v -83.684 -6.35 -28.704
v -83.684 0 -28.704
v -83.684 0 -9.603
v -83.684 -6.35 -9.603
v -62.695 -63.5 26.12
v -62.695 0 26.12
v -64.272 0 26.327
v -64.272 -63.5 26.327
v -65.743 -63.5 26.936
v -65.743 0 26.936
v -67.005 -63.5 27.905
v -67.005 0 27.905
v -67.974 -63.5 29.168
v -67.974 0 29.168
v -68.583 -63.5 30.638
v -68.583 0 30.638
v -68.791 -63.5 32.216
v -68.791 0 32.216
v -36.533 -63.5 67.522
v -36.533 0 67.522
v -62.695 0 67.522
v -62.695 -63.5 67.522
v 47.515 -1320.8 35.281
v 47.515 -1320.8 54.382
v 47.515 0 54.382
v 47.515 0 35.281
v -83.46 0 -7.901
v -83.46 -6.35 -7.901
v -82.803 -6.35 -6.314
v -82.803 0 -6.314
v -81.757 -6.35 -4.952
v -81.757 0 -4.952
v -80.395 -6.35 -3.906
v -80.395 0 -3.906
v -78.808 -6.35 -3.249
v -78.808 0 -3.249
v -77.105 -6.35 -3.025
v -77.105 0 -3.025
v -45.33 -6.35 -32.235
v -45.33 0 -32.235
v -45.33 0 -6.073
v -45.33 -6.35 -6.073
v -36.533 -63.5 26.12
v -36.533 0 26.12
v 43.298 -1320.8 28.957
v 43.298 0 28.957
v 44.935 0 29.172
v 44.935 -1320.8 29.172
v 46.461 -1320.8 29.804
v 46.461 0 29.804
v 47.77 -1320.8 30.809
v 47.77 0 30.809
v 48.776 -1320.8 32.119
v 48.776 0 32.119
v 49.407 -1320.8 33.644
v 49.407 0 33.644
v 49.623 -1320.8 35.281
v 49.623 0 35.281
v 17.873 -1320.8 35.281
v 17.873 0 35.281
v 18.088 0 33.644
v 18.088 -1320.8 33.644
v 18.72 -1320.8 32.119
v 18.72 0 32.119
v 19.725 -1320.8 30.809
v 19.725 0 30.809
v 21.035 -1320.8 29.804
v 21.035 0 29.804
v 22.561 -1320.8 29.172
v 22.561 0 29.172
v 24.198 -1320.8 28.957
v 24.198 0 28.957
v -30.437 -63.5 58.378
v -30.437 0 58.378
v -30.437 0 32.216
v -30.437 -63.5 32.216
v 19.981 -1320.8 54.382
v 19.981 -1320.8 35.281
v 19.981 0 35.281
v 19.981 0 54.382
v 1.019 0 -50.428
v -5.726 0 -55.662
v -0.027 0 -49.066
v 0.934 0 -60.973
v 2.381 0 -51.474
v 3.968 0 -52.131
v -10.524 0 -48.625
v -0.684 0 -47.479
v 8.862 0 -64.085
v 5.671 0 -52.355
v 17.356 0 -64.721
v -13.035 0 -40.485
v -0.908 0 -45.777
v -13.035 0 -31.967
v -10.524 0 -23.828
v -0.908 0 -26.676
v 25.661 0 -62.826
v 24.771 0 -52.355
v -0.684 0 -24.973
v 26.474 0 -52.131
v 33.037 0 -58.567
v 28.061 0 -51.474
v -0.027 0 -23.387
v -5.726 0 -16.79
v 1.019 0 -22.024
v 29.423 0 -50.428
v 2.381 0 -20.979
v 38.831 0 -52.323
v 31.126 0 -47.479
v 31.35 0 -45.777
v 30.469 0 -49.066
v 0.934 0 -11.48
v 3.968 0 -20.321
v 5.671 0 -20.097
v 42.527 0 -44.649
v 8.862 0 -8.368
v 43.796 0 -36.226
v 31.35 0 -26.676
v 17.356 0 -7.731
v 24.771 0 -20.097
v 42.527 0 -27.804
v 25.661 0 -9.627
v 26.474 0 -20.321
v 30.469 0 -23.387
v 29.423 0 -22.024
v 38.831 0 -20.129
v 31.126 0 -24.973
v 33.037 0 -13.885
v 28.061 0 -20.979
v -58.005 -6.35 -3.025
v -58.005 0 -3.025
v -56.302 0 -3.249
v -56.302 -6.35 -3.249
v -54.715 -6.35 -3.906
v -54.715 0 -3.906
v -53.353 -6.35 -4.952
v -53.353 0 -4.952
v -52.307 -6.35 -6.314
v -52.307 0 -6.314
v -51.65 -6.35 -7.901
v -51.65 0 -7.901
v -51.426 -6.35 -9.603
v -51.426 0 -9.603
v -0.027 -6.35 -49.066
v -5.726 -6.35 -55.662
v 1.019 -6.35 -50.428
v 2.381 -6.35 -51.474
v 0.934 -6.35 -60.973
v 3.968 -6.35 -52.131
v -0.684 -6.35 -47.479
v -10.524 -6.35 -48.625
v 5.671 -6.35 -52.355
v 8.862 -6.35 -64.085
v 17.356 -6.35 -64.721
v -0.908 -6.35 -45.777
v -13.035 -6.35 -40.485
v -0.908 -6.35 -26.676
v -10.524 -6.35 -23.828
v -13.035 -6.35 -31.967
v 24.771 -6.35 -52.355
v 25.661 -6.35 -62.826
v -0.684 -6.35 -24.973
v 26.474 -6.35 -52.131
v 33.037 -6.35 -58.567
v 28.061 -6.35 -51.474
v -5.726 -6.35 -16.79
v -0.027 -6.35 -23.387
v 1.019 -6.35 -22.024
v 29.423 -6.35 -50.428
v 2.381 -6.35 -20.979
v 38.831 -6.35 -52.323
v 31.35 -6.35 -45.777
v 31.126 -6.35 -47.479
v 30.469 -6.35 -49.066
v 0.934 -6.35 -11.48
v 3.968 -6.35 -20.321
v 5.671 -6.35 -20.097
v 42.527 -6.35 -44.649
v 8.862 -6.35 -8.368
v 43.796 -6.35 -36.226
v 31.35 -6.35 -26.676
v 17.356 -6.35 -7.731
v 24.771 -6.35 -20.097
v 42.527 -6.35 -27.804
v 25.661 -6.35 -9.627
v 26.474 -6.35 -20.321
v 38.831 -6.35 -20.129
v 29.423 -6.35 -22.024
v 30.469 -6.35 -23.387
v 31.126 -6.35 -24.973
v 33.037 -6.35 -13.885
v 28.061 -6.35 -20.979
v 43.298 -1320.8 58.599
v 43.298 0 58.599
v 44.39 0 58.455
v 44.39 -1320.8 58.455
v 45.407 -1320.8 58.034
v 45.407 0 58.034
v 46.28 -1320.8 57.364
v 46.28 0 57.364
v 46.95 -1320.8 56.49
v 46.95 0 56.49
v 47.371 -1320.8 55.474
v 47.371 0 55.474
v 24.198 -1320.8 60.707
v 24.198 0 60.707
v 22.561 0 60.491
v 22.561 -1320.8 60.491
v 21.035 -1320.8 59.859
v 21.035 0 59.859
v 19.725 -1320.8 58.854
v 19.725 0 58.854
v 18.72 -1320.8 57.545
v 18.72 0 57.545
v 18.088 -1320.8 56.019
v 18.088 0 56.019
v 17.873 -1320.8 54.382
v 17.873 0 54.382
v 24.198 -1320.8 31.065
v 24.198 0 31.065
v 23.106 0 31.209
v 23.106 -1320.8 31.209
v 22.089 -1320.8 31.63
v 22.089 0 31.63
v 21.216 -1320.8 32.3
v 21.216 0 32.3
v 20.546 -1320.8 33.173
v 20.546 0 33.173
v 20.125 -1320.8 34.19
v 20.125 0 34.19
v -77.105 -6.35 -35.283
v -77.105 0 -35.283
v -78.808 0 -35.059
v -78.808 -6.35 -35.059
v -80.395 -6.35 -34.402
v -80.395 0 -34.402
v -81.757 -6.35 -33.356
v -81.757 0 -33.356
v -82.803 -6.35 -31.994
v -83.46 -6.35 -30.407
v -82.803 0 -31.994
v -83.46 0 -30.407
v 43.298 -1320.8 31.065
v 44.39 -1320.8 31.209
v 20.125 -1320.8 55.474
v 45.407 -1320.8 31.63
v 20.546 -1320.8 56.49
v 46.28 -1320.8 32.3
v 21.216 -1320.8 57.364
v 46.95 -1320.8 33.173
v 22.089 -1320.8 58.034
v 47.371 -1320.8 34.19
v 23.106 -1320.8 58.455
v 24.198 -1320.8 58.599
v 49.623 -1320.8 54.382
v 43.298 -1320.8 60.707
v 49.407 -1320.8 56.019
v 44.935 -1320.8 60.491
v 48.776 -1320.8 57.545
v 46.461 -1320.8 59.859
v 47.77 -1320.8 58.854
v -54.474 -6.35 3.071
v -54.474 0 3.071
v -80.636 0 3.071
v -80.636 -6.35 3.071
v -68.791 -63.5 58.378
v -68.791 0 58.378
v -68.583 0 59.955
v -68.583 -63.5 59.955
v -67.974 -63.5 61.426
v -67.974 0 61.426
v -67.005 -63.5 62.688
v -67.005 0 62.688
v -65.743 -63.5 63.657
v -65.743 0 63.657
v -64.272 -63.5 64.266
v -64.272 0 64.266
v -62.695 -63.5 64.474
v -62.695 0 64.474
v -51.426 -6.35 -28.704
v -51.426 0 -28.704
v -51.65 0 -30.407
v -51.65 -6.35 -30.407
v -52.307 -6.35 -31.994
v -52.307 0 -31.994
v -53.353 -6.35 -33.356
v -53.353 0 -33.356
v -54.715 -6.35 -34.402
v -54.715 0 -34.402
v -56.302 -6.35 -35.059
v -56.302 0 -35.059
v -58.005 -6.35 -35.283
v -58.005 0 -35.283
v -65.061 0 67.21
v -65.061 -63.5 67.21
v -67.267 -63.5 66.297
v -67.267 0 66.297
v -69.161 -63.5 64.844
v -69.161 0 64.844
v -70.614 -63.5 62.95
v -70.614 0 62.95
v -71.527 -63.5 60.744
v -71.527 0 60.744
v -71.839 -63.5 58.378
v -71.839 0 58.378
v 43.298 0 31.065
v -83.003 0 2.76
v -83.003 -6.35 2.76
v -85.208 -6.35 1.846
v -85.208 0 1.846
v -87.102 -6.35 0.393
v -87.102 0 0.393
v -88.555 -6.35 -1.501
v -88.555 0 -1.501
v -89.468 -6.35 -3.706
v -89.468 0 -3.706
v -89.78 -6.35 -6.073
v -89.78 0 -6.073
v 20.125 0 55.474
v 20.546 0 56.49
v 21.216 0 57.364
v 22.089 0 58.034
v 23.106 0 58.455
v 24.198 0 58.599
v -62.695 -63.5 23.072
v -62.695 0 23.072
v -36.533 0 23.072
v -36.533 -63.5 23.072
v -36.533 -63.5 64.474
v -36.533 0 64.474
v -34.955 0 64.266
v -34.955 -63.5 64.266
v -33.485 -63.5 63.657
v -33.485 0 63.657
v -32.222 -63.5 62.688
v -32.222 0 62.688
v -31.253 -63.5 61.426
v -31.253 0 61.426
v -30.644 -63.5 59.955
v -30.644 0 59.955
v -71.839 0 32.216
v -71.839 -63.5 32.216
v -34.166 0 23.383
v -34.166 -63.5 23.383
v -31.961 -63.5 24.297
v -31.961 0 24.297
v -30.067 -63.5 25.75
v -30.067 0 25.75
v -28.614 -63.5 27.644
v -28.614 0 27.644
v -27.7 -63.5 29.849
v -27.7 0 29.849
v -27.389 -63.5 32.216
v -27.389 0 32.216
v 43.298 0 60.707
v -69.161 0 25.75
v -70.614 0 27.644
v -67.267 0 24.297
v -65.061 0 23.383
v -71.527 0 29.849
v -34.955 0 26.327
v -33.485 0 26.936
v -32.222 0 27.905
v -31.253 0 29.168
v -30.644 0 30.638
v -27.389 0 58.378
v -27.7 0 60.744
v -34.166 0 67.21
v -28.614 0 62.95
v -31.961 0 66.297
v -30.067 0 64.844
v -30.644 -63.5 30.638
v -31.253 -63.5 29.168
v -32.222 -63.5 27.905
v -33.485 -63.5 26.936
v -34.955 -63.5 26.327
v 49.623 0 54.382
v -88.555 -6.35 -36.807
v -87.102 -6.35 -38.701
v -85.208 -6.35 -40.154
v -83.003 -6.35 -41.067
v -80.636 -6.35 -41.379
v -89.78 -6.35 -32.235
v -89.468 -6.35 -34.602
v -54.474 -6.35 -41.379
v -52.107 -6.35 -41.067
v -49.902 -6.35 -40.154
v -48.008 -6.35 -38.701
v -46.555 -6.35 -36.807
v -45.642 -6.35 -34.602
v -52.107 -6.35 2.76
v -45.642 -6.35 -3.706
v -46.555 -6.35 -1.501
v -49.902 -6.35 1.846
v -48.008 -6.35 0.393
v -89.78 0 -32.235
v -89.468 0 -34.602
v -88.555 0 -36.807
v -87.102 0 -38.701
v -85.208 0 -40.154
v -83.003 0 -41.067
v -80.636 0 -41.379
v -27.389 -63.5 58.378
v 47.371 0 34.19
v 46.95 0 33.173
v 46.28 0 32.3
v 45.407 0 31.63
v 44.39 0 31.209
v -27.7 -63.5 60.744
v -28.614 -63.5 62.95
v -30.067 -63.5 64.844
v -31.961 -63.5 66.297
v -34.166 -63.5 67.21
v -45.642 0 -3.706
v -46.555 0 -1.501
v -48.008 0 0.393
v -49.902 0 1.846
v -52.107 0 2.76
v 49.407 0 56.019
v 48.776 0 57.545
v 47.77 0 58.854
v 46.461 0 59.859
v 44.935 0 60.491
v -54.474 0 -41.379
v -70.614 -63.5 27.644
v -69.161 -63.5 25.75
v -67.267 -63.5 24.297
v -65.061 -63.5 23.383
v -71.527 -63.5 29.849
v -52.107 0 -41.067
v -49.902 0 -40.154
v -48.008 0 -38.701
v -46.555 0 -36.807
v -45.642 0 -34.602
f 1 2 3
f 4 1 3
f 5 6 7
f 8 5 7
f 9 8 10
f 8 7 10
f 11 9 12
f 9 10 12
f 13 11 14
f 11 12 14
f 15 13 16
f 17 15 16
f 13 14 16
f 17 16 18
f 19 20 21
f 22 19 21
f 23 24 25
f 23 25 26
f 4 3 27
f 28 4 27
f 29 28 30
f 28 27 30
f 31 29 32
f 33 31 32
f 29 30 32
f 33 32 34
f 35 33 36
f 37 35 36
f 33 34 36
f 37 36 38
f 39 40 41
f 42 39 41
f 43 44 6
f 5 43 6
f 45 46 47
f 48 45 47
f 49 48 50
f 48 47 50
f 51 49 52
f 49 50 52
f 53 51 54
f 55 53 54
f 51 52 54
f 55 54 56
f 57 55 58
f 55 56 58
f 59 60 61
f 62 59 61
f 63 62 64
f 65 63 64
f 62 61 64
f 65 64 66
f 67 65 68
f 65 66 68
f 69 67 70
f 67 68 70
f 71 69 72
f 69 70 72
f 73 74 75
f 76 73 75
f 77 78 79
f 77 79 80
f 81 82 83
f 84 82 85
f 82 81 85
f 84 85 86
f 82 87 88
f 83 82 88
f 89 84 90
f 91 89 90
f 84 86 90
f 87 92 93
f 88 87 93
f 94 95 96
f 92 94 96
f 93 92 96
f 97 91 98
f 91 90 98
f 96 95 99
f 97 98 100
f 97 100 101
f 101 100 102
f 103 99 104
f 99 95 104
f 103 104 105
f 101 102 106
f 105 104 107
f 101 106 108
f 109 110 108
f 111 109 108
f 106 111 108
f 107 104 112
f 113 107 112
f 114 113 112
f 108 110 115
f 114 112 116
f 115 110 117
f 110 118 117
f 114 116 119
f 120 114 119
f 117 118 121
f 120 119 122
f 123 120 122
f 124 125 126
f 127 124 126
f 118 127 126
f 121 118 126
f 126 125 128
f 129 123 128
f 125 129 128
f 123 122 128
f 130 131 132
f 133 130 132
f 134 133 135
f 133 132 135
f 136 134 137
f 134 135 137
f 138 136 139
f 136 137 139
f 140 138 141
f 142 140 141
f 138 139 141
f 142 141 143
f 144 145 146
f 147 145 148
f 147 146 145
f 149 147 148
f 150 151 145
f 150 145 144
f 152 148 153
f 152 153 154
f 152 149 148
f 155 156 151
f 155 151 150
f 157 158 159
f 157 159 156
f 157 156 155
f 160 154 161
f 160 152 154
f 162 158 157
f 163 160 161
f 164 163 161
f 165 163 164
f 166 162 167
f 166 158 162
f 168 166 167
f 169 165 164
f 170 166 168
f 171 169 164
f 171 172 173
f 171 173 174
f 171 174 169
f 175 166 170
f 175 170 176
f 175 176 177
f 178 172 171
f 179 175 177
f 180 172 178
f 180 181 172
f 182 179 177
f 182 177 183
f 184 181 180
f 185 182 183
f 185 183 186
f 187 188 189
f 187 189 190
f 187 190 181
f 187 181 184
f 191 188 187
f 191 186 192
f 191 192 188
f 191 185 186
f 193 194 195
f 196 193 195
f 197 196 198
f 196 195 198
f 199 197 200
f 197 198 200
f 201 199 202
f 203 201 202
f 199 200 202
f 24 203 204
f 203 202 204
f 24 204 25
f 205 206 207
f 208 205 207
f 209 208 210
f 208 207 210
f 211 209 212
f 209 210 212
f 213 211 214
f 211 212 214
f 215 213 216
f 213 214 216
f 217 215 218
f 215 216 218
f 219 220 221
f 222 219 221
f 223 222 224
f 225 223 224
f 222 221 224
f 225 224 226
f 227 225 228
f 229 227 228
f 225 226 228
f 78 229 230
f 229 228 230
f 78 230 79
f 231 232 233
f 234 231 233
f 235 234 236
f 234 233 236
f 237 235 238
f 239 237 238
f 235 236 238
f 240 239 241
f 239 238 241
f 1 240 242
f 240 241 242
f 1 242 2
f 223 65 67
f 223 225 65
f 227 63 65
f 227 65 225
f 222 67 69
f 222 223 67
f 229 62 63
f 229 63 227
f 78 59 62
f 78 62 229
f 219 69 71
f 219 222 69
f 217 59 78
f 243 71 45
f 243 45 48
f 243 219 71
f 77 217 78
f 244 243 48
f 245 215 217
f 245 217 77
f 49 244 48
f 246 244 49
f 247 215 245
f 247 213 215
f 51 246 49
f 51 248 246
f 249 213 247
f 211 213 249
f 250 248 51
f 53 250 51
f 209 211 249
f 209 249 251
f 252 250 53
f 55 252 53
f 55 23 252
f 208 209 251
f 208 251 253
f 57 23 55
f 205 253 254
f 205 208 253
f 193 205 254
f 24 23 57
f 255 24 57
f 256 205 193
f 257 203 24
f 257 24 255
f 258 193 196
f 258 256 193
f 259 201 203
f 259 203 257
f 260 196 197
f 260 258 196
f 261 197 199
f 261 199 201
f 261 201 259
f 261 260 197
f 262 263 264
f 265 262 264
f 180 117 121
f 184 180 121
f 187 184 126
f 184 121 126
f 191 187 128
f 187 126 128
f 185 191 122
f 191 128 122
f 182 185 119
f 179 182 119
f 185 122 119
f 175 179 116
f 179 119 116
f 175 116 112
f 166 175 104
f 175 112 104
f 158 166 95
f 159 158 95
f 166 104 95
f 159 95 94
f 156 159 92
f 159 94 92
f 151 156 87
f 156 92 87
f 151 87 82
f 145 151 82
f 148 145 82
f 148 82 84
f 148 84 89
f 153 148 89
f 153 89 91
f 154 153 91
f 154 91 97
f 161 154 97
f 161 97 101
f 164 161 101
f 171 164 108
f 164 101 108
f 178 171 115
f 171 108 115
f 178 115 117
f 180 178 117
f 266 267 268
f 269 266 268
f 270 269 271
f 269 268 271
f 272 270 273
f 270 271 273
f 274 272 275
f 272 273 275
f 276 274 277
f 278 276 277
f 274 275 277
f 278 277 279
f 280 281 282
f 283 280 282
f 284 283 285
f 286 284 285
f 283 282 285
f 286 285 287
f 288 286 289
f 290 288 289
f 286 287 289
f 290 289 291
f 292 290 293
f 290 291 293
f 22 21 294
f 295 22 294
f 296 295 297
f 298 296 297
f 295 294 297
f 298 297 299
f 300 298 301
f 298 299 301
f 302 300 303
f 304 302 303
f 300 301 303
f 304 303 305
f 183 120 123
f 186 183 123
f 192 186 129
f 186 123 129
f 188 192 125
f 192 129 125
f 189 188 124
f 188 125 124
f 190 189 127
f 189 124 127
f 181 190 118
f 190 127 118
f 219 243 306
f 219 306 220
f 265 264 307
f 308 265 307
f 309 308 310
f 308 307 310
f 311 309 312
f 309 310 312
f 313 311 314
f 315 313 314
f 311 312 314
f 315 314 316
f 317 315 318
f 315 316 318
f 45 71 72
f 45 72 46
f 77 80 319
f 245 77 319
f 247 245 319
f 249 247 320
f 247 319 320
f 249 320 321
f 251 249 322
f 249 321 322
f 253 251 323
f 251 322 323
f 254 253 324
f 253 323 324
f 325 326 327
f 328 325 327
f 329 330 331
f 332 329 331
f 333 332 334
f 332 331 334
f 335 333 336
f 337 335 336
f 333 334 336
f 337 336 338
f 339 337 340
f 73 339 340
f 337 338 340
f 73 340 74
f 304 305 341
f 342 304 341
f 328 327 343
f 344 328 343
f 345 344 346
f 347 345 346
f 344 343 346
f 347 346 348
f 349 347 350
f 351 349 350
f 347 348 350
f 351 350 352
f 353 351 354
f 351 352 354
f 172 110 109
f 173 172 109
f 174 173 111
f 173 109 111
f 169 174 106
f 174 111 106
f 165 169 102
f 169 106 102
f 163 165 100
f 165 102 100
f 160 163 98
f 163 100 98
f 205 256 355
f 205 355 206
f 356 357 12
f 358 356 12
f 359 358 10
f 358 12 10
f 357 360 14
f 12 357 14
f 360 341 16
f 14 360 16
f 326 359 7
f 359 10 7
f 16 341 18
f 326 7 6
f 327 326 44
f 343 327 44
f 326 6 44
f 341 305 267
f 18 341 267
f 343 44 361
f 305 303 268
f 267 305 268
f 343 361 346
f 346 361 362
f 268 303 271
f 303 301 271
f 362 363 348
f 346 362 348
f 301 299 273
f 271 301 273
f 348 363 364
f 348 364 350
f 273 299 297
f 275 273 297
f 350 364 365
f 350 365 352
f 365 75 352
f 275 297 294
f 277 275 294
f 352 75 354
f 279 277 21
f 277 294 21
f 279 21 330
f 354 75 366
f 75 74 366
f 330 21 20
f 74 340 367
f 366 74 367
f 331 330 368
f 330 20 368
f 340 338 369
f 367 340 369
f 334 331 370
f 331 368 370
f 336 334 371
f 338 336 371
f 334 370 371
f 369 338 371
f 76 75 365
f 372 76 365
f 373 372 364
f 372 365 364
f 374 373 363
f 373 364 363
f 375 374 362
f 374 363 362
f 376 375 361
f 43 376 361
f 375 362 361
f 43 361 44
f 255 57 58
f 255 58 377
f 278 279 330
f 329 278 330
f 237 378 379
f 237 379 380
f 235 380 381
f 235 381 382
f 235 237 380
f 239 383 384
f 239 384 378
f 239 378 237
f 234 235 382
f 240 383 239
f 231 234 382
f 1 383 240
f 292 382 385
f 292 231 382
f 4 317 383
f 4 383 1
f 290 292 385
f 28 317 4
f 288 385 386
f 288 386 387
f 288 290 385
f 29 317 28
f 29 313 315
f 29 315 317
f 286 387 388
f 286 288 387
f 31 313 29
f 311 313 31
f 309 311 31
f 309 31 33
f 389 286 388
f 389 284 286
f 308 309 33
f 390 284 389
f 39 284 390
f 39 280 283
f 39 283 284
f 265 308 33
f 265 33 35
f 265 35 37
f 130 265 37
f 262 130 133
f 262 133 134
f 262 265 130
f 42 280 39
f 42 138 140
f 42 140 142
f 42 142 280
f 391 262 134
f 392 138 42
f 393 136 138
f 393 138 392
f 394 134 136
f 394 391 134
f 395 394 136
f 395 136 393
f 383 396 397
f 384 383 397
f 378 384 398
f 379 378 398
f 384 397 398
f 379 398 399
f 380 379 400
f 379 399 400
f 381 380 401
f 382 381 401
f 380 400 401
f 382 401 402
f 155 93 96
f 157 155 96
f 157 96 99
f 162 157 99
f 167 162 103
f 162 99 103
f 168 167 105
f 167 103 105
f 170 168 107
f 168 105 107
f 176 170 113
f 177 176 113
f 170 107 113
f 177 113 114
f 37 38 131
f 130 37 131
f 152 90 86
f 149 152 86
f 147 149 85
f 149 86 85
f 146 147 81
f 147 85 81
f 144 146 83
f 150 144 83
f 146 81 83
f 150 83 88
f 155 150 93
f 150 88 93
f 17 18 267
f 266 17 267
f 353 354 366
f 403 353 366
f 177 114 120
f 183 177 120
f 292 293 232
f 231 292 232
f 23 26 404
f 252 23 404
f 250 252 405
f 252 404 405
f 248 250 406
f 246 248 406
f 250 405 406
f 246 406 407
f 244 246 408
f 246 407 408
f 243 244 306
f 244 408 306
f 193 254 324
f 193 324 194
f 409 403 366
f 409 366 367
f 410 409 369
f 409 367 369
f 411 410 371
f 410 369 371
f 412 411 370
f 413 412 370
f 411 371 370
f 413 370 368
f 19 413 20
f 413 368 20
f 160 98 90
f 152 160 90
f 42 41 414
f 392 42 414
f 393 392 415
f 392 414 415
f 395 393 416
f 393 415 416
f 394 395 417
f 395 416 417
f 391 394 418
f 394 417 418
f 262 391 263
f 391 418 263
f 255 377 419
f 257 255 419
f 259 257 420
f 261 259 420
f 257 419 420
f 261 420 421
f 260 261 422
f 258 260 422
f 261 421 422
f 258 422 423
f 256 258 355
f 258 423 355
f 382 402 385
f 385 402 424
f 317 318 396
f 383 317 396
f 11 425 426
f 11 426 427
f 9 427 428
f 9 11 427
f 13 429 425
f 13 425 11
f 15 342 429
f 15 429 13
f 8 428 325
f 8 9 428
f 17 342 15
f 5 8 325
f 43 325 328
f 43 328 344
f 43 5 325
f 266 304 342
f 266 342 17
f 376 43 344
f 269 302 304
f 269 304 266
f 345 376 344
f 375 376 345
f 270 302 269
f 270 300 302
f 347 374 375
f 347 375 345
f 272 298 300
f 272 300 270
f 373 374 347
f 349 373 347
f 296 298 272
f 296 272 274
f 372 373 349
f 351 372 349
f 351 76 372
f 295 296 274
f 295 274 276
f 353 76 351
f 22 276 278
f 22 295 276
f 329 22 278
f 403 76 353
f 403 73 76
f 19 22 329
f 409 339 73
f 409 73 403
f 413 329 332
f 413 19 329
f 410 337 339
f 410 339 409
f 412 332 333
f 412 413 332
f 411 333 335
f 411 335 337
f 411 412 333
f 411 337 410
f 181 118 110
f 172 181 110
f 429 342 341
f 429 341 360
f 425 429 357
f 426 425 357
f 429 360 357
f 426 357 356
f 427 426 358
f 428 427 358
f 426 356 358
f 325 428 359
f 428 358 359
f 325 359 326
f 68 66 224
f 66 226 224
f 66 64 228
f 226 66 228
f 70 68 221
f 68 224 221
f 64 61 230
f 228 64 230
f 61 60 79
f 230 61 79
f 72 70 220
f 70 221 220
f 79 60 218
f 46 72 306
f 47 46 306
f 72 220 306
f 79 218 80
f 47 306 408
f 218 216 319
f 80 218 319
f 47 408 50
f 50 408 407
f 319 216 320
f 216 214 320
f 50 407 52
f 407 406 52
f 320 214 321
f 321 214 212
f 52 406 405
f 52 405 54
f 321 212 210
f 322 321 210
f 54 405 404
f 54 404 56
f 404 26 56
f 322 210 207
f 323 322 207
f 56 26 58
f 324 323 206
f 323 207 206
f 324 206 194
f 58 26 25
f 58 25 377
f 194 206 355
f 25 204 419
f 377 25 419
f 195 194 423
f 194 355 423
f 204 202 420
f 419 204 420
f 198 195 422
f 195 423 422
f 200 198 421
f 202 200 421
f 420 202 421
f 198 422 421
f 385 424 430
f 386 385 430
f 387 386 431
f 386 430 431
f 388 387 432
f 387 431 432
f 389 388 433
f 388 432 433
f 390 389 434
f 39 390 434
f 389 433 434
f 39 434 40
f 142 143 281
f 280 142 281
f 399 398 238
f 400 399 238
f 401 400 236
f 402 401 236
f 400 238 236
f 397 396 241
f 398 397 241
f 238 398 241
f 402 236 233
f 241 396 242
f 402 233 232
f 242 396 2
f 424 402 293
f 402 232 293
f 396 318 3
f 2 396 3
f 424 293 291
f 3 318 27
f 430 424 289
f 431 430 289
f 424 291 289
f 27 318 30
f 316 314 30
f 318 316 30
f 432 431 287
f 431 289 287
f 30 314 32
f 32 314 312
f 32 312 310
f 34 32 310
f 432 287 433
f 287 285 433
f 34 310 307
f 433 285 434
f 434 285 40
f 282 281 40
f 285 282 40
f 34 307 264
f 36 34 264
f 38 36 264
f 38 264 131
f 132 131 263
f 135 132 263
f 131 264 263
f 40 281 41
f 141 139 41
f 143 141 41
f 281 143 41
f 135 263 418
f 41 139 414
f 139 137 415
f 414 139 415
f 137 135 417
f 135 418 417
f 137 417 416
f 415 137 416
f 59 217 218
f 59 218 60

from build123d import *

# Parameters (mm, degrees)
F1_DEPTH = 63.5
F3_DEPTH = 1320.8
F5_DEPTH = 6.35
F6_R     = 28.575
F7_DEPTH = 6.35


with BuildPart() as f1:
    # F0 (on Front) → F1 (new body)
    with BuildSketch(Plane.XZ):
        with BuildLine():
            Line((-36.532738, 67.521737), (-62.694738, 67.521737))
            ThreePointArc((-62.694738, 67.521737), (-69.160523, 64.843521), (-71.838738, 58.377737))
            Line((-71.838738, 58.377737), (-71.838738, 32.215737))
            ThreePointArc((-71.838738, 32.215737), (-69.160523, 25.749953), (-62.694738, 23.071737))
            Line((-62.694738, 23.071737), (-36.532738, 23.071737))
            ThreePointArc((-36.532738, 23.071737), (-30.066954, 25.749953), (-27.388738, 32.215737))
            Line((-27.388738, 32.215737), (-27.388738, 58.377737))
            ThreePointArc((-27.388738, 58.377737), (-30.066954, 64.843521), (-36.532738, 67.521737))
        make_face()
        with BuildLine():
            ThreePointArc((-68.790738, 58.377737), (-67.005261, 62.68826), (-62.694738, 64.473737))
            Line((-62.694738, 64.473737), (-36.532738, 64.473737))
            ThreePointArc((-36.532738, 64.473737), (-32.222215, 62.68826), (-30.436738, 58.377737))
            Line((-30.436738, 58.377737), (-30.436738, 32.215737))
            ThreePointArc((-30.436738, 32.215737), (-32.222215, 27.905214), (-36.532738, 26.119737))
            Line((-36.532738, 26.119737), (-62.694738, 26.119737))
            ThreePointArc((-62.694738, 26.119737), (-67.005261, 27.905214), (-68.790738, 32.215737))
            Line((-68.790738, 32.215737), (-68.790738, 58.377737))
        make_face(mode=Mode.SUBTRACT)
    extrude(amount=F1_DEPTH)


with BuildPart() as f3:
    # F2 (on Front) → F3 (new body)
    with BuildSketch(Plane.XZ):
        with BuildLine():
            Line((43.298324, 60.706825), (24.197524, 60.706825))
            ThreePointArc((24.197524, 60.706825), (19.725356, 58.854393), (17.872924, 54.382225))
            Line((17.872924, 54.382225), (17.872924, 35.281425))
            ThreePointArc((17.872924, 35.281425), (19.725356, 30.809258), (24.197524, 28.956825))
            Line((24.197524, 28.956825), (43.298324, 28.956825))
            ThreePointArc((43.298324, 28.956825), (47.770491, 30.809258), (49.622924, 35.281425))
            Line((49.622924, 35.281425), (49.622924, 54.382225))
            ThreePointArc((49.622924, 54.382225), (47.770491, 58.854393), (43.298324, 60.706825))
        make_face()
        with BuildLine():
            ThreePointArc((19.981124, 54.382225), (21.216079, 57.36367), (24.197524, 58.598625))
            Line((24.197524, 58.598625), (43.298324, 58.598625))
            ThreePointArc((43.298324, 58.598625), (46.279769, 57.36367), (47.514724, 54.382225))
            Line((47.514724, 54.382225), (47.514724, 35.281425))
            ThreePointArc((47.514724, 35.281425), (46.279769, 32.29998), (43.298324, 31.065025))
            Line((43.298324, 31.065025), (24.197524, 31.065025))
            ThreePointArc((24.197524, 31.065025), (21.216079, 32.29998), (19.981124, 35.281425))
            Line((19.981124, 35.281425), (19.981124, 54.382225))
        make_face(mode=Mode.SUBTRACT)
    extrude(amount=F3_DEPTH)


with BuildPart() as f5:
    # F4 (on Front) → F5 (new body)
    with BuildSketch(Plane.XZ):
        with BuildLine():
            Line((-54.473966, 3.071115), (-80.635966, 3.071115))
            ThreePointArc((-80.635966, 3.071115), (-87.10175, 0.392899), (-89.779966, -6.072885))
            Line((-89.779966, -6.072885), (-89.779966, -32.234885))
            ThreePointArc((-89.779966, -32.234885), (-87.10175, -38.70067), (-80.635966, -41.378885))
            Line((-80.635966, -41.378885), (-54.473966, -41.378885))
            ThreePointArc((-54.473966, -41.378885), (-48.008181, -38.70067), (-45.329966, -32.234885))
            Line((-45.329966, -32.234885), (-45.329966, -6.072885))
            ThreePointArc((-45.329966, -6.072885), (-48.008181, 0.392899), (-54.473966, 3.071115))
        make_face()
        with BuildLine():
            ThreePointArc((-83.683966, -9.603485), (-81.757138, -4.951713), (-77.105366, -3.024885))
            Line((-77.105366, -3.024885), (-58.004566, -3.024885))
            ThreePointArc((-58.004566, -3.024885), (-53.352793, -4.951713), (-51.425966, -9.603485))
            Line((-51.425966, -9.603485), (-51.425966, -28.704285))
            ThreePointArc((-51.425966, -28.704285), (-53.352793, -33.356058), (-58.004566, -35.282885))
            Line((-58.004566, -35.282885), (-77.105366, -35.282885))
            ThreePointArc((-77.105366, -35.282885), (-81.757138, -33.356058), (-83.683966, -28.704285))
            Line((-83.683966, -28.704285), (-83.683966, -9.603485))
        make_face(mode=Mode.SUBTRACT)
    extrude(amount=F5_DEPTH)


with BuildPart() as f7:
    # F6 (on Front) → F7 (new body)
    with BuildSketch(Plane.XZ):
        with Locations((15.221031, -36.226293)):
            Circle(F6_R)
        with BuildLine():
            ThreePointArc((-0.907969, -26.675893), (1.018859, -22.02412), (5.670631, -20.097293))
            Line((5.670631, -20.097293), (24.771431, -20.097293))
            ThreePointArc((24.771431, -20.097293), (29.423204, -22.02412), (31.350031, -26.675893))
            Line((31.350031, -26.675893), (31.350031, -45.776693))
            ThreePointArc((31.350031, -45.776693), (29.423204, -50.428465), (24.771431, -52.355293))
            Line((24.771431, -52.355293), (5.670631, -52.355293))
            ThreePointArc((5.670631, -52.355293), (1.018859, -50.428465), (-0.907969, -45.776693))
            Line((-0.907969, -45.776693), (-0.907969, -26.675893))
        make_face(mode=Mode.SUBTRACT)
    extrude(amount=F7_DEPTH)


solid = Compound([f1.part, f3.part, f5.part, f7.part])
